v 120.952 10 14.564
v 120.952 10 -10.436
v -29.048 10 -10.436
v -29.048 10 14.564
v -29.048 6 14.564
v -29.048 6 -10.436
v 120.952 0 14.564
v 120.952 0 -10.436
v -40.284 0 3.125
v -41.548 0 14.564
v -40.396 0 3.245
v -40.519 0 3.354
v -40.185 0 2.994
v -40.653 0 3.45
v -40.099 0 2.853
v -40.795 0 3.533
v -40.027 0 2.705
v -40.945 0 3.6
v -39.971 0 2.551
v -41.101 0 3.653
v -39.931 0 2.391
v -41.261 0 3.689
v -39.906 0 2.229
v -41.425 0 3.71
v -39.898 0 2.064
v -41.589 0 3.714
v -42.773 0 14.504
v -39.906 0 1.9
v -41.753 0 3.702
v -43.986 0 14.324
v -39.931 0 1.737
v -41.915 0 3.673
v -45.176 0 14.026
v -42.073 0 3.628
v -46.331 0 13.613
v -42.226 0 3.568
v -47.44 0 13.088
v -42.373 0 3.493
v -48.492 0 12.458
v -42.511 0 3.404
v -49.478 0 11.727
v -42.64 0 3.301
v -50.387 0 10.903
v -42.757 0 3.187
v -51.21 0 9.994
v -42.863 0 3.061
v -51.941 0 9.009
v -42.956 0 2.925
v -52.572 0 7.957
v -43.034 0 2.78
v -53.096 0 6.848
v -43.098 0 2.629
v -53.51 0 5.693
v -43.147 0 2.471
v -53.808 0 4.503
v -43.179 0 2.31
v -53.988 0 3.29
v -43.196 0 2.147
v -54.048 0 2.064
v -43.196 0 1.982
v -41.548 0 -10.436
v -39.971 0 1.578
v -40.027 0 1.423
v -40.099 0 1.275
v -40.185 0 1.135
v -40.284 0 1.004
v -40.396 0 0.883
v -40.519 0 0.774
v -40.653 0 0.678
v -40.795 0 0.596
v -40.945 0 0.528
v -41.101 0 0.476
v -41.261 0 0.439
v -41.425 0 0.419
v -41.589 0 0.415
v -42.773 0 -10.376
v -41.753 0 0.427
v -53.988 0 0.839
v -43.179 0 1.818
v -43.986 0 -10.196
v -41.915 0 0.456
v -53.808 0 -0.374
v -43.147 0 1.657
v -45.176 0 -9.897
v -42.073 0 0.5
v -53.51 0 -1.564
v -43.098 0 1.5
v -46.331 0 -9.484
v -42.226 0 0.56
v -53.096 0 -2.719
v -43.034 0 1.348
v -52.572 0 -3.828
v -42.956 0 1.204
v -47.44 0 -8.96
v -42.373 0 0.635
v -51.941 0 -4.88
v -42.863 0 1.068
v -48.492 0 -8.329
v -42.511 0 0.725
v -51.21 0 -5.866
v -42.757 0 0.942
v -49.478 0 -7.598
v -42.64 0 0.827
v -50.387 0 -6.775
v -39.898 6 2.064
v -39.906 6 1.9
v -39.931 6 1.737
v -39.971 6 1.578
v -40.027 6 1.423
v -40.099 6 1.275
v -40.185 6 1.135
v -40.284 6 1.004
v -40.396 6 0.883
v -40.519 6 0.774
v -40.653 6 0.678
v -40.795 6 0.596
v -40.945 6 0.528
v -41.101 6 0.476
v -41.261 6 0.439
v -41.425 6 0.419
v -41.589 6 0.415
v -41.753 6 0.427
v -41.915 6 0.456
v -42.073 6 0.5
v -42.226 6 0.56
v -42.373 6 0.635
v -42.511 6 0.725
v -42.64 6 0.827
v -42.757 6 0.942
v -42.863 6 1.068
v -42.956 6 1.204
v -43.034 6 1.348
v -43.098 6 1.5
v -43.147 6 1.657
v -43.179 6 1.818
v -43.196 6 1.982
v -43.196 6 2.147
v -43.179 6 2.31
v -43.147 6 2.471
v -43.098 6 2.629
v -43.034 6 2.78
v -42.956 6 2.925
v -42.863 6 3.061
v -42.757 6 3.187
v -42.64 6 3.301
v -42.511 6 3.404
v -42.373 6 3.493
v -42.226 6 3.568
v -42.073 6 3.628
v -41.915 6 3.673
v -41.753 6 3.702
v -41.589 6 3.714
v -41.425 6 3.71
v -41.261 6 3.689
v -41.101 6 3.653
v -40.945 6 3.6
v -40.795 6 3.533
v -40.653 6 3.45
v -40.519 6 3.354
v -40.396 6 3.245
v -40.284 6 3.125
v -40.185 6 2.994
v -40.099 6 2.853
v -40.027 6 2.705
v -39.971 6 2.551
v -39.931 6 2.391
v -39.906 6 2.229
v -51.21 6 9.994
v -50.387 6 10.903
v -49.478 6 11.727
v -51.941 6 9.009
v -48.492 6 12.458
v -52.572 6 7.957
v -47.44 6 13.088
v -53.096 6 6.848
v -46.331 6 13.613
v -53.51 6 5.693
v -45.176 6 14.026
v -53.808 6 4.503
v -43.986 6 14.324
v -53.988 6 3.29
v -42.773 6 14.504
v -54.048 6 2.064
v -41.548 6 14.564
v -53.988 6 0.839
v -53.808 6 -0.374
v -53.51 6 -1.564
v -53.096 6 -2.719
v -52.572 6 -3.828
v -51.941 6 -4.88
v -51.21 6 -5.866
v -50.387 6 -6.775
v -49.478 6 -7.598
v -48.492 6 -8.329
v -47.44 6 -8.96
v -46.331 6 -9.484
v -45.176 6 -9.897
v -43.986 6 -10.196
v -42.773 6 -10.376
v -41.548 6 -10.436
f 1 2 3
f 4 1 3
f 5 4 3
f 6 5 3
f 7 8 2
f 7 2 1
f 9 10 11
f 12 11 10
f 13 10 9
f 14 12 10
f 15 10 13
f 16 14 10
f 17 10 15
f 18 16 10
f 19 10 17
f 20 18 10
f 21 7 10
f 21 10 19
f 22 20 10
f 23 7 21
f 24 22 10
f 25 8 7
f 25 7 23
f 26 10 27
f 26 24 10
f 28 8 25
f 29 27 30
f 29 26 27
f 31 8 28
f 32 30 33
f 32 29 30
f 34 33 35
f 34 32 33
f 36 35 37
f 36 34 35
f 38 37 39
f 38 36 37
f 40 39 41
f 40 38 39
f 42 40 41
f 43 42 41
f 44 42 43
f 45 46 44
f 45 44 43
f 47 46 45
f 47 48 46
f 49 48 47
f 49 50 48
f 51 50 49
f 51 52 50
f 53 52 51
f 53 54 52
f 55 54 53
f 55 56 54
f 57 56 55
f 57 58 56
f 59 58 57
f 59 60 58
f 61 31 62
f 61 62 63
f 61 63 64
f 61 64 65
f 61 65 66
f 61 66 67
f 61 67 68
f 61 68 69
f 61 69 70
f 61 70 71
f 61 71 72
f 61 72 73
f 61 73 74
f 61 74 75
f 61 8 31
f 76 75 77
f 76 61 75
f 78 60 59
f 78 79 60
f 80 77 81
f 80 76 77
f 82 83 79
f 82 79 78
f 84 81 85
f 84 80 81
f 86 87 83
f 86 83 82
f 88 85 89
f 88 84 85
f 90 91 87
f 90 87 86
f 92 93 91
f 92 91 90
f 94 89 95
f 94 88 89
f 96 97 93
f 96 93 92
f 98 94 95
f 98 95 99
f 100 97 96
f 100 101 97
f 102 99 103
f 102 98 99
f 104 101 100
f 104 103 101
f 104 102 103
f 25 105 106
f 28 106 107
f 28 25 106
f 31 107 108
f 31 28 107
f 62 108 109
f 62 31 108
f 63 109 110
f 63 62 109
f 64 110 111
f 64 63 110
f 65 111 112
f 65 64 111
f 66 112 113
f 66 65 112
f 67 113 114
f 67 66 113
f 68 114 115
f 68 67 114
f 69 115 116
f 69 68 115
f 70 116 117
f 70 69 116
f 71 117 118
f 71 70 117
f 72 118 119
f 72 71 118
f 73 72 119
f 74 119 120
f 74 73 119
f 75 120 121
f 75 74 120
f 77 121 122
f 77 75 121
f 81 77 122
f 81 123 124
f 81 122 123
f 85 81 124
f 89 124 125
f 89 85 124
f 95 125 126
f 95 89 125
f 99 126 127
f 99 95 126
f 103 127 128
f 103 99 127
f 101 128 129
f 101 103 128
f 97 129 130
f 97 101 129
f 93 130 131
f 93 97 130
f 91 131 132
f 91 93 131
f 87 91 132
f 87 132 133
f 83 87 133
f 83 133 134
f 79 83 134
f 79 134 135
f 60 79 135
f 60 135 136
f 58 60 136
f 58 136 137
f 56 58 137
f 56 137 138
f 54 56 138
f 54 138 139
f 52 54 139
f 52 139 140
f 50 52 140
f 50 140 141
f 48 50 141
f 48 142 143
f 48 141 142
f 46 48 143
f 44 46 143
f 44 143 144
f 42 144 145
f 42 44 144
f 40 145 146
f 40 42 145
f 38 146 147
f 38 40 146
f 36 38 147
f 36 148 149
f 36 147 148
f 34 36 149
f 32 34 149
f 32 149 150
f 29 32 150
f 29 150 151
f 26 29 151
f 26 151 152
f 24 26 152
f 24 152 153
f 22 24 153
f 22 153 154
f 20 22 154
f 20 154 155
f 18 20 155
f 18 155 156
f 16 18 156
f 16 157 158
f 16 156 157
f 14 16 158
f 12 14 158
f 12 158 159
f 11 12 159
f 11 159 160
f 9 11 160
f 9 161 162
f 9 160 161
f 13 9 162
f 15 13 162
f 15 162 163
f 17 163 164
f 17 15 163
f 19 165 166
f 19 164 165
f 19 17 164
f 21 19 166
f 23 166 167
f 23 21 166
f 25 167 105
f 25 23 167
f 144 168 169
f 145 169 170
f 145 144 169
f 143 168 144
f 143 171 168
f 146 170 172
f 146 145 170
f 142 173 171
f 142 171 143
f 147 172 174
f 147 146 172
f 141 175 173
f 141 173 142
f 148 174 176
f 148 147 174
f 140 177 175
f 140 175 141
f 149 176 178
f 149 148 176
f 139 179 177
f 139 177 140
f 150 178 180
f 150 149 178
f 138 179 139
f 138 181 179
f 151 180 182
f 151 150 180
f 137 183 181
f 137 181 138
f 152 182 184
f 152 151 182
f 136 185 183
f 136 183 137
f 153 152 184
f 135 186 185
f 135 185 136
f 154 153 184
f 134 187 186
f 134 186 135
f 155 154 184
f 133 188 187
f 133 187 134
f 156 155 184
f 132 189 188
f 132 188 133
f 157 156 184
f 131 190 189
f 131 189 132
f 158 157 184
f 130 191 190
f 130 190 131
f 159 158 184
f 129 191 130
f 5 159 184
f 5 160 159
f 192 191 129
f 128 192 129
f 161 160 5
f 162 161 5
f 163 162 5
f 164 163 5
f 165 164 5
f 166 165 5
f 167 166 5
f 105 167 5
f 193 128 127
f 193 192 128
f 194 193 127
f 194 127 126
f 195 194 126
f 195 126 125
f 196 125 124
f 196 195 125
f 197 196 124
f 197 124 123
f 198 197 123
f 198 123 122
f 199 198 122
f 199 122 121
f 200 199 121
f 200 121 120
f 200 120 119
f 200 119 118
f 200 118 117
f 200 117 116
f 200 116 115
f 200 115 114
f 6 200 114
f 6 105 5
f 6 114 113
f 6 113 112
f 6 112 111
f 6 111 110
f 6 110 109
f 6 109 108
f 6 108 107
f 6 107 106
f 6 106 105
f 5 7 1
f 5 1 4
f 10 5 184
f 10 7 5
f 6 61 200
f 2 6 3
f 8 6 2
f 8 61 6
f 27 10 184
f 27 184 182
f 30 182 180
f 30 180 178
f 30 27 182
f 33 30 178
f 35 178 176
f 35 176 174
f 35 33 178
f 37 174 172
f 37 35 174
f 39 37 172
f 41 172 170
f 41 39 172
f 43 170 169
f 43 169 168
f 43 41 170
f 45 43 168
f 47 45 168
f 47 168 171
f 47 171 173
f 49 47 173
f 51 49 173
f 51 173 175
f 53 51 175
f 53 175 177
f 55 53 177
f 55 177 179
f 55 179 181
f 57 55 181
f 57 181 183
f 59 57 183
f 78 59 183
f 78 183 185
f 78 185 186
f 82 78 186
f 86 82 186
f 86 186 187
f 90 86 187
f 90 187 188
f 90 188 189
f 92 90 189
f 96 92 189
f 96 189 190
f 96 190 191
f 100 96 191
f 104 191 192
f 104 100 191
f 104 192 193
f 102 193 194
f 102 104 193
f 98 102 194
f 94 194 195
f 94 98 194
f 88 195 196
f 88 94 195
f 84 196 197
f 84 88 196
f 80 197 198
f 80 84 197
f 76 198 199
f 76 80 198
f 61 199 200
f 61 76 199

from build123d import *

# Parameters (mm, degrees)
SKETCH1_R           = 1.65
BOSS_EXTRUDE1_DEPTH = 10
SKETCH2_W           = 29.50673097
SKETCH2_H           = 30.126833799
CUT_EXTRUDE1_DEPTH  = 4


with BuildPart() as part:
    # Sketch1 → Boss-Extrude1 (new body)
    with BuildSketch(Plane(origin=(0, 0, 0), x_dir=(1, 0, 0), z_dir=(0, 1, 0))):
        with BuildLine():
            Line((-41.547817516, 10.435693018), (120.952182484, 10.435693018))
            Line((120.952182484, 10.435693018), (120.952182484, -14.564306982))
            Line((120.952182484, -14.564306982), (-41.547817516, -14.564306982))
            ThreePointArc((-41.547817516, -14.564306982), (-54.047817516, -2.064306982), (-41.547817516, 10.435693018))
        make_face()
        with Locations((-41.547817516, -2.064306982)):
            Circle(SKETCH1_R, mode=Mode.SUBTRACT)
    extrude(amount=BOSS_EXTRUDE1_DEPTH)

    # Sketch2 → Cut-Extrude1 (cut)
    with BuildSketch(Plane(origin=(0, 10, 0), x_dir=(1, 0, 0), z_dir=(0, 1, 0))):
        with Locations((-43.801183001, 0.499109917)):
            Rectangle(SKETCH2_W, SKETCH2_H)
    extrude(amount=-CUT_EXTRUDE1_DEPTH, mode=Mode.SUBTRACT)


solid = part.part
